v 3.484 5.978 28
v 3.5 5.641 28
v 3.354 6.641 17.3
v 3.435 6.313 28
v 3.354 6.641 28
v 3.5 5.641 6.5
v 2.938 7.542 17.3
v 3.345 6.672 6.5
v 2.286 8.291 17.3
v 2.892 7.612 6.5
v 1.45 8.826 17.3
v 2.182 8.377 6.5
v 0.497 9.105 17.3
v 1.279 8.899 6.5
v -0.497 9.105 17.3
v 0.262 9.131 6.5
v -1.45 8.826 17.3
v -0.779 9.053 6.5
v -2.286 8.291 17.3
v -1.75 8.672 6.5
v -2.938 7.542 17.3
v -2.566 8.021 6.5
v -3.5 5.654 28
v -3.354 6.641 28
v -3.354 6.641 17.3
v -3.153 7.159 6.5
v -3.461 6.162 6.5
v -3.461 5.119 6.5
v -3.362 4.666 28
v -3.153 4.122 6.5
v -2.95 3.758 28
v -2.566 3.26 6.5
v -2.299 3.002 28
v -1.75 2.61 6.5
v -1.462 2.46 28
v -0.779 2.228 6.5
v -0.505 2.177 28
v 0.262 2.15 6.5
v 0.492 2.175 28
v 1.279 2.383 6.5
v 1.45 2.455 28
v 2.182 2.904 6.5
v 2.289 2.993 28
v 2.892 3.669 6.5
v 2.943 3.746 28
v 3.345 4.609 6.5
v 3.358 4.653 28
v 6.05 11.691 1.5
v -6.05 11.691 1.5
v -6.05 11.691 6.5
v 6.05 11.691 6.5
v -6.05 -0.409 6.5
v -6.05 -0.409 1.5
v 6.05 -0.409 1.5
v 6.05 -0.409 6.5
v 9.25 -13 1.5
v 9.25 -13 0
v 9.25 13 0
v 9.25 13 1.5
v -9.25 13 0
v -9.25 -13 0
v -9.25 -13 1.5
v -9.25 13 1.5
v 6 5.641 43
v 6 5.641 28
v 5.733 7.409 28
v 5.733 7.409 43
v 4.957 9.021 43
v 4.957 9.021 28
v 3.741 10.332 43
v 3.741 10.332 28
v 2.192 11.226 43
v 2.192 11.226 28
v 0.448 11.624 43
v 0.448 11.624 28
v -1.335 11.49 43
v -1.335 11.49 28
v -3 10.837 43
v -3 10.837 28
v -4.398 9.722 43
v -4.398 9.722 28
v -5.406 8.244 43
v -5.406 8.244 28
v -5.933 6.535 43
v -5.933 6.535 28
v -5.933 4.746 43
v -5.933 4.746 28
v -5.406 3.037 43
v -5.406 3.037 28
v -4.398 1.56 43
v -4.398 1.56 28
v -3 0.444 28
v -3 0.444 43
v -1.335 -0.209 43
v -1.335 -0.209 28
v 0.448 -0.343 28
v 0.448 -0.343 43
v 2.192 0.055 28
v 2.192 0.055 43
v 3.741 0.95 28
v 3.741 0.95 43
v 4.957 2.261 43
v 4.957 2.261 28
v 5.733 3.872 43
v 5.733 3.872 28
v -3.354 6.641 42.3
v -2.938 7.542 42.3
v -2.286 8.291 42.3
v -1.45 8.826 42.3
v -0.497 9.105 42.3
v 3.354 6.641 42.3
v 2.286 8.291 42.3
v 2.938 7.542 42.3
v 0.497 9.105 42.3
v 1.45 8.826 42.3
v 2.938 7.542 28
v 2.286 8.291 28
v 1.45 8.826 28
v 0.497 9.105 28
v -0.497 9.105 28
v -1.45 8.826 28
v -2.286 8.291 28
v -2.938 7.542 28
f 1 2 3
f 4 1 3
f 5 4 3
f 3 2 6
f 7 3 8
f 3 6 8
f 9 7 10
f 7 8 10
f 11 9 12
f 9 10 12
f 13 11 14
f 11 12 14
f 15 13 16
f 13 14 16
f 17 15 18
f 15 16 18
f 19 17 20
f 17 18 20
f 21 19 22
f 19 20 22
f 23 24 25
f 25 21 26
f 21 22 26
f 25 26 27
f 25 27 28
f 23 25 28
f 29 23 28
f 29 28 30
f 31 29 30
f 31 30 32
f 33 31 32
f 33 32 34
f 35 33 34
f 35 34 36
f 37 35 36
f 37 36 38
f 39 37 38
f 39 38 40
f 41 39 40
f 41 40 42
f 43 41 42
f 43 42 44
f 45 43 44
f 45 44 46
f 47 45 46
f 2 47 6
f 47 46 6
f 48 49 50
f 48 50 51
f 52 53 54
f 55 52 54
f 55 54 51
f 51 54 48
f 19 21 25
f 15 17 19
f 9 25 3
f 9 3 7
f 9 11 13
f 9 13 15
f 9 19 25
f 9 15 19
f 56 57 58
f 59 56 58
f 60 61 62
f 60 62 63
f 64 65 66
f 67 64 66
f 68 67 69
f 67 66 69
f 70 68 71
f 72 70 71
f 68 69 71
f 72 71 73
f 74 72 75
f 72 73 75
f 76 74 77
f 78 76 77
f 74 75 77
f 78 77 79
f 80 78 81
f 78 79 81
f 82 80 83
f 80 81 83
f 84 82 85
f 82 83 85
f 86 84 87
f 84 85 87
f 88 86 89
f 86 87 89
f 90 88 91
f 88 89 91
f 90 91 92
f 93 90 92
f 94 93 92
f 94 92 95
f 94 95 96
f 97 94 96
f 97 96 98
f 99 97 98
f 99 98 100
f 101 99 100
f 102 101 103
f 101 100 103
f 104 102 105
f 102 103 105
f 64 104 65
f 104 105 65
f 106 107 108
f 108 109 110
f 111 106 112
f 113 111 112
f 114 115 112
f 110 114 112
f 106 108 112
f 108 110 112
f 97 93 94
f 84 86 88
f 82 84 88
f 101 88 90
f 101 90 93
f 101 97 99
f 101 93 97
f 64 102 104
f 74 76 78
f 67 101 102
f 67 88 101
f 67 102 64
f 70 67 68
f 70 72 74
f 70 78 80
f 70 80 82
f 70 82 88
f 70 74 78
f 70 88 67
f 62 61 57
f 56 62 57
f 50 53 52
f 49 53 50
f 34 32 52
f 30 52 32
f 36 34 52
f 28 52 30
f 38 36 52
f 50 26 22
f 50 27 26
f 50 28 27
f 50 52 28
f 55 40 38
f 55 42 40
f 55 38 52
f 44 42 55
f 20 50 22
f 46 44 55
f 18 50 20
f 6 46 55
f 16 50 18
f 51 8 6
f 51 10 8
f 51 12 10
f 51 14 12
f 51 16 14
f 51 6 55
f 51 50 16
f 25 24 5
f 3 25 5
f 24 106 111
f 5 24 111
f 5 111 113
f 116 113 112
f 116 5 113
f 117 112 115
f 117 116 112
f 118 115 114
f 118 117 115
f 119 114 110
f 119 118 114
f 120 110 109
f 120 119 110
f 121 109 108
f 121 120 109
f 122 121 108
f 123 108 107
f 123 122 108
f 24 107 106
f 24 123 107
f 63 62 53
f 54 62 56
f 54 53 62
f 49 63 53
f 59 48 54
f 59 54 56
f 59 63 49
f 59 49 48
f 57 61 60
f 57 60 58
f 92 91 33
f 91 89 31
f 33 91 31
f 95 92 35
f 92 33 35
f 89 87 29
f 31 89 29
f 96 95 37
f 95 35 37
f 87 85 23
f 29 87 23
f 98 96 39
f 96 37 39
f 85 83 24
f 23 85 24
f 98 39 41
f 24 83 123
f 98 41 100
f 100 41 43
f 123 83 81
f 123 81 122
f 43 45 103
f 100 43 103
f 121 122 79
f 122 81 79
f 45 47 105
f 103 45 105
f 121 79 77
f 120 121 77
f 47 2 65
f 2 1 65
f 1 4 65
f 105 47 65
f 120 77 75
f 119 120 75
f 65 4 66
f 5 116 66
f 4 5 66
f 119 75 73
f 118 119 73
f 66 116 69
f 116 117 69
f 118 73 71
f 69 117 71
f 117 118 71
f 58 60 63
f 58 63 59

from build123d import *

# Parameters (mm, degrees)
F0_W      = 18.5
F0_H      = 26
F1_DEPTH  = 1.5
F2_W      = 12.1
F2_H      = 12.1
F3_DEPTH  = 5
F4_R      = 3.5
F5_DEPTH  = 21.5
F7_DEPTH  = 10.7
F8_R      = 6
F9_DEPTH  = 15
F10_DEPTH = 25


with BuildPart() as f1:
    # F0 (on Top) → F1 (new body)
    with BuildSketch(Plane.XY):
        Rectangle(F0_W, F0_H)
    extrude(amount=F1_DEPTH)

    # F2 (on face) → F3 (join)
    with BuildSketch(Plane.XY.offset(1.5)):
        with Locations((0, 5.640632961)):
            Rectangle(F2_W, F2_H)
    extrude(amount=F3_DEPTH)

    # F4 (on face) → F5 (join)
    with BuildSketch(Plane.XY.offset(6.5)):
        with Locations((0, 5.640632961)):
            Circle(F4_R)
    extrude(amount=F5_DEPTH)

    # F6 (on face) → F7 (cut)
    with BuildSketch(Plane.XY.offset(28)):
        with BuildLine():
            Line((-3.3541019662, 6.640632961), (0, 6.640632961))
            Line((0, 6.640632961), (3.3541019662, 6.640632961))
            ThreePointArc((3.3541019662, 6.640632961), (0, 9.140632961), (-3.3541019662, 6.640632961))
        make_face()
    extrude(amount=-F7_DEPTH, mode=Mode.SUBTRACT)

    # F8 (on face) → F9 (join)
    with BuildSketch(Plane.XY.offset(28)):
        with Locations((0, 5.640632961)):
            Circle(F8_R)
    extrude(amount=F9_DEPTH)

    # F10 (cut): a face of the model
    f10_faces = [f1.faces().sort_by_distance(p)[0] for p in [
        (0, 7.6794032986, 17.3),
    ]]
    extrude(f10_faces, amount=F10_DEPTH, mode=Mode.SUBTRACT)


solid = f1.part
